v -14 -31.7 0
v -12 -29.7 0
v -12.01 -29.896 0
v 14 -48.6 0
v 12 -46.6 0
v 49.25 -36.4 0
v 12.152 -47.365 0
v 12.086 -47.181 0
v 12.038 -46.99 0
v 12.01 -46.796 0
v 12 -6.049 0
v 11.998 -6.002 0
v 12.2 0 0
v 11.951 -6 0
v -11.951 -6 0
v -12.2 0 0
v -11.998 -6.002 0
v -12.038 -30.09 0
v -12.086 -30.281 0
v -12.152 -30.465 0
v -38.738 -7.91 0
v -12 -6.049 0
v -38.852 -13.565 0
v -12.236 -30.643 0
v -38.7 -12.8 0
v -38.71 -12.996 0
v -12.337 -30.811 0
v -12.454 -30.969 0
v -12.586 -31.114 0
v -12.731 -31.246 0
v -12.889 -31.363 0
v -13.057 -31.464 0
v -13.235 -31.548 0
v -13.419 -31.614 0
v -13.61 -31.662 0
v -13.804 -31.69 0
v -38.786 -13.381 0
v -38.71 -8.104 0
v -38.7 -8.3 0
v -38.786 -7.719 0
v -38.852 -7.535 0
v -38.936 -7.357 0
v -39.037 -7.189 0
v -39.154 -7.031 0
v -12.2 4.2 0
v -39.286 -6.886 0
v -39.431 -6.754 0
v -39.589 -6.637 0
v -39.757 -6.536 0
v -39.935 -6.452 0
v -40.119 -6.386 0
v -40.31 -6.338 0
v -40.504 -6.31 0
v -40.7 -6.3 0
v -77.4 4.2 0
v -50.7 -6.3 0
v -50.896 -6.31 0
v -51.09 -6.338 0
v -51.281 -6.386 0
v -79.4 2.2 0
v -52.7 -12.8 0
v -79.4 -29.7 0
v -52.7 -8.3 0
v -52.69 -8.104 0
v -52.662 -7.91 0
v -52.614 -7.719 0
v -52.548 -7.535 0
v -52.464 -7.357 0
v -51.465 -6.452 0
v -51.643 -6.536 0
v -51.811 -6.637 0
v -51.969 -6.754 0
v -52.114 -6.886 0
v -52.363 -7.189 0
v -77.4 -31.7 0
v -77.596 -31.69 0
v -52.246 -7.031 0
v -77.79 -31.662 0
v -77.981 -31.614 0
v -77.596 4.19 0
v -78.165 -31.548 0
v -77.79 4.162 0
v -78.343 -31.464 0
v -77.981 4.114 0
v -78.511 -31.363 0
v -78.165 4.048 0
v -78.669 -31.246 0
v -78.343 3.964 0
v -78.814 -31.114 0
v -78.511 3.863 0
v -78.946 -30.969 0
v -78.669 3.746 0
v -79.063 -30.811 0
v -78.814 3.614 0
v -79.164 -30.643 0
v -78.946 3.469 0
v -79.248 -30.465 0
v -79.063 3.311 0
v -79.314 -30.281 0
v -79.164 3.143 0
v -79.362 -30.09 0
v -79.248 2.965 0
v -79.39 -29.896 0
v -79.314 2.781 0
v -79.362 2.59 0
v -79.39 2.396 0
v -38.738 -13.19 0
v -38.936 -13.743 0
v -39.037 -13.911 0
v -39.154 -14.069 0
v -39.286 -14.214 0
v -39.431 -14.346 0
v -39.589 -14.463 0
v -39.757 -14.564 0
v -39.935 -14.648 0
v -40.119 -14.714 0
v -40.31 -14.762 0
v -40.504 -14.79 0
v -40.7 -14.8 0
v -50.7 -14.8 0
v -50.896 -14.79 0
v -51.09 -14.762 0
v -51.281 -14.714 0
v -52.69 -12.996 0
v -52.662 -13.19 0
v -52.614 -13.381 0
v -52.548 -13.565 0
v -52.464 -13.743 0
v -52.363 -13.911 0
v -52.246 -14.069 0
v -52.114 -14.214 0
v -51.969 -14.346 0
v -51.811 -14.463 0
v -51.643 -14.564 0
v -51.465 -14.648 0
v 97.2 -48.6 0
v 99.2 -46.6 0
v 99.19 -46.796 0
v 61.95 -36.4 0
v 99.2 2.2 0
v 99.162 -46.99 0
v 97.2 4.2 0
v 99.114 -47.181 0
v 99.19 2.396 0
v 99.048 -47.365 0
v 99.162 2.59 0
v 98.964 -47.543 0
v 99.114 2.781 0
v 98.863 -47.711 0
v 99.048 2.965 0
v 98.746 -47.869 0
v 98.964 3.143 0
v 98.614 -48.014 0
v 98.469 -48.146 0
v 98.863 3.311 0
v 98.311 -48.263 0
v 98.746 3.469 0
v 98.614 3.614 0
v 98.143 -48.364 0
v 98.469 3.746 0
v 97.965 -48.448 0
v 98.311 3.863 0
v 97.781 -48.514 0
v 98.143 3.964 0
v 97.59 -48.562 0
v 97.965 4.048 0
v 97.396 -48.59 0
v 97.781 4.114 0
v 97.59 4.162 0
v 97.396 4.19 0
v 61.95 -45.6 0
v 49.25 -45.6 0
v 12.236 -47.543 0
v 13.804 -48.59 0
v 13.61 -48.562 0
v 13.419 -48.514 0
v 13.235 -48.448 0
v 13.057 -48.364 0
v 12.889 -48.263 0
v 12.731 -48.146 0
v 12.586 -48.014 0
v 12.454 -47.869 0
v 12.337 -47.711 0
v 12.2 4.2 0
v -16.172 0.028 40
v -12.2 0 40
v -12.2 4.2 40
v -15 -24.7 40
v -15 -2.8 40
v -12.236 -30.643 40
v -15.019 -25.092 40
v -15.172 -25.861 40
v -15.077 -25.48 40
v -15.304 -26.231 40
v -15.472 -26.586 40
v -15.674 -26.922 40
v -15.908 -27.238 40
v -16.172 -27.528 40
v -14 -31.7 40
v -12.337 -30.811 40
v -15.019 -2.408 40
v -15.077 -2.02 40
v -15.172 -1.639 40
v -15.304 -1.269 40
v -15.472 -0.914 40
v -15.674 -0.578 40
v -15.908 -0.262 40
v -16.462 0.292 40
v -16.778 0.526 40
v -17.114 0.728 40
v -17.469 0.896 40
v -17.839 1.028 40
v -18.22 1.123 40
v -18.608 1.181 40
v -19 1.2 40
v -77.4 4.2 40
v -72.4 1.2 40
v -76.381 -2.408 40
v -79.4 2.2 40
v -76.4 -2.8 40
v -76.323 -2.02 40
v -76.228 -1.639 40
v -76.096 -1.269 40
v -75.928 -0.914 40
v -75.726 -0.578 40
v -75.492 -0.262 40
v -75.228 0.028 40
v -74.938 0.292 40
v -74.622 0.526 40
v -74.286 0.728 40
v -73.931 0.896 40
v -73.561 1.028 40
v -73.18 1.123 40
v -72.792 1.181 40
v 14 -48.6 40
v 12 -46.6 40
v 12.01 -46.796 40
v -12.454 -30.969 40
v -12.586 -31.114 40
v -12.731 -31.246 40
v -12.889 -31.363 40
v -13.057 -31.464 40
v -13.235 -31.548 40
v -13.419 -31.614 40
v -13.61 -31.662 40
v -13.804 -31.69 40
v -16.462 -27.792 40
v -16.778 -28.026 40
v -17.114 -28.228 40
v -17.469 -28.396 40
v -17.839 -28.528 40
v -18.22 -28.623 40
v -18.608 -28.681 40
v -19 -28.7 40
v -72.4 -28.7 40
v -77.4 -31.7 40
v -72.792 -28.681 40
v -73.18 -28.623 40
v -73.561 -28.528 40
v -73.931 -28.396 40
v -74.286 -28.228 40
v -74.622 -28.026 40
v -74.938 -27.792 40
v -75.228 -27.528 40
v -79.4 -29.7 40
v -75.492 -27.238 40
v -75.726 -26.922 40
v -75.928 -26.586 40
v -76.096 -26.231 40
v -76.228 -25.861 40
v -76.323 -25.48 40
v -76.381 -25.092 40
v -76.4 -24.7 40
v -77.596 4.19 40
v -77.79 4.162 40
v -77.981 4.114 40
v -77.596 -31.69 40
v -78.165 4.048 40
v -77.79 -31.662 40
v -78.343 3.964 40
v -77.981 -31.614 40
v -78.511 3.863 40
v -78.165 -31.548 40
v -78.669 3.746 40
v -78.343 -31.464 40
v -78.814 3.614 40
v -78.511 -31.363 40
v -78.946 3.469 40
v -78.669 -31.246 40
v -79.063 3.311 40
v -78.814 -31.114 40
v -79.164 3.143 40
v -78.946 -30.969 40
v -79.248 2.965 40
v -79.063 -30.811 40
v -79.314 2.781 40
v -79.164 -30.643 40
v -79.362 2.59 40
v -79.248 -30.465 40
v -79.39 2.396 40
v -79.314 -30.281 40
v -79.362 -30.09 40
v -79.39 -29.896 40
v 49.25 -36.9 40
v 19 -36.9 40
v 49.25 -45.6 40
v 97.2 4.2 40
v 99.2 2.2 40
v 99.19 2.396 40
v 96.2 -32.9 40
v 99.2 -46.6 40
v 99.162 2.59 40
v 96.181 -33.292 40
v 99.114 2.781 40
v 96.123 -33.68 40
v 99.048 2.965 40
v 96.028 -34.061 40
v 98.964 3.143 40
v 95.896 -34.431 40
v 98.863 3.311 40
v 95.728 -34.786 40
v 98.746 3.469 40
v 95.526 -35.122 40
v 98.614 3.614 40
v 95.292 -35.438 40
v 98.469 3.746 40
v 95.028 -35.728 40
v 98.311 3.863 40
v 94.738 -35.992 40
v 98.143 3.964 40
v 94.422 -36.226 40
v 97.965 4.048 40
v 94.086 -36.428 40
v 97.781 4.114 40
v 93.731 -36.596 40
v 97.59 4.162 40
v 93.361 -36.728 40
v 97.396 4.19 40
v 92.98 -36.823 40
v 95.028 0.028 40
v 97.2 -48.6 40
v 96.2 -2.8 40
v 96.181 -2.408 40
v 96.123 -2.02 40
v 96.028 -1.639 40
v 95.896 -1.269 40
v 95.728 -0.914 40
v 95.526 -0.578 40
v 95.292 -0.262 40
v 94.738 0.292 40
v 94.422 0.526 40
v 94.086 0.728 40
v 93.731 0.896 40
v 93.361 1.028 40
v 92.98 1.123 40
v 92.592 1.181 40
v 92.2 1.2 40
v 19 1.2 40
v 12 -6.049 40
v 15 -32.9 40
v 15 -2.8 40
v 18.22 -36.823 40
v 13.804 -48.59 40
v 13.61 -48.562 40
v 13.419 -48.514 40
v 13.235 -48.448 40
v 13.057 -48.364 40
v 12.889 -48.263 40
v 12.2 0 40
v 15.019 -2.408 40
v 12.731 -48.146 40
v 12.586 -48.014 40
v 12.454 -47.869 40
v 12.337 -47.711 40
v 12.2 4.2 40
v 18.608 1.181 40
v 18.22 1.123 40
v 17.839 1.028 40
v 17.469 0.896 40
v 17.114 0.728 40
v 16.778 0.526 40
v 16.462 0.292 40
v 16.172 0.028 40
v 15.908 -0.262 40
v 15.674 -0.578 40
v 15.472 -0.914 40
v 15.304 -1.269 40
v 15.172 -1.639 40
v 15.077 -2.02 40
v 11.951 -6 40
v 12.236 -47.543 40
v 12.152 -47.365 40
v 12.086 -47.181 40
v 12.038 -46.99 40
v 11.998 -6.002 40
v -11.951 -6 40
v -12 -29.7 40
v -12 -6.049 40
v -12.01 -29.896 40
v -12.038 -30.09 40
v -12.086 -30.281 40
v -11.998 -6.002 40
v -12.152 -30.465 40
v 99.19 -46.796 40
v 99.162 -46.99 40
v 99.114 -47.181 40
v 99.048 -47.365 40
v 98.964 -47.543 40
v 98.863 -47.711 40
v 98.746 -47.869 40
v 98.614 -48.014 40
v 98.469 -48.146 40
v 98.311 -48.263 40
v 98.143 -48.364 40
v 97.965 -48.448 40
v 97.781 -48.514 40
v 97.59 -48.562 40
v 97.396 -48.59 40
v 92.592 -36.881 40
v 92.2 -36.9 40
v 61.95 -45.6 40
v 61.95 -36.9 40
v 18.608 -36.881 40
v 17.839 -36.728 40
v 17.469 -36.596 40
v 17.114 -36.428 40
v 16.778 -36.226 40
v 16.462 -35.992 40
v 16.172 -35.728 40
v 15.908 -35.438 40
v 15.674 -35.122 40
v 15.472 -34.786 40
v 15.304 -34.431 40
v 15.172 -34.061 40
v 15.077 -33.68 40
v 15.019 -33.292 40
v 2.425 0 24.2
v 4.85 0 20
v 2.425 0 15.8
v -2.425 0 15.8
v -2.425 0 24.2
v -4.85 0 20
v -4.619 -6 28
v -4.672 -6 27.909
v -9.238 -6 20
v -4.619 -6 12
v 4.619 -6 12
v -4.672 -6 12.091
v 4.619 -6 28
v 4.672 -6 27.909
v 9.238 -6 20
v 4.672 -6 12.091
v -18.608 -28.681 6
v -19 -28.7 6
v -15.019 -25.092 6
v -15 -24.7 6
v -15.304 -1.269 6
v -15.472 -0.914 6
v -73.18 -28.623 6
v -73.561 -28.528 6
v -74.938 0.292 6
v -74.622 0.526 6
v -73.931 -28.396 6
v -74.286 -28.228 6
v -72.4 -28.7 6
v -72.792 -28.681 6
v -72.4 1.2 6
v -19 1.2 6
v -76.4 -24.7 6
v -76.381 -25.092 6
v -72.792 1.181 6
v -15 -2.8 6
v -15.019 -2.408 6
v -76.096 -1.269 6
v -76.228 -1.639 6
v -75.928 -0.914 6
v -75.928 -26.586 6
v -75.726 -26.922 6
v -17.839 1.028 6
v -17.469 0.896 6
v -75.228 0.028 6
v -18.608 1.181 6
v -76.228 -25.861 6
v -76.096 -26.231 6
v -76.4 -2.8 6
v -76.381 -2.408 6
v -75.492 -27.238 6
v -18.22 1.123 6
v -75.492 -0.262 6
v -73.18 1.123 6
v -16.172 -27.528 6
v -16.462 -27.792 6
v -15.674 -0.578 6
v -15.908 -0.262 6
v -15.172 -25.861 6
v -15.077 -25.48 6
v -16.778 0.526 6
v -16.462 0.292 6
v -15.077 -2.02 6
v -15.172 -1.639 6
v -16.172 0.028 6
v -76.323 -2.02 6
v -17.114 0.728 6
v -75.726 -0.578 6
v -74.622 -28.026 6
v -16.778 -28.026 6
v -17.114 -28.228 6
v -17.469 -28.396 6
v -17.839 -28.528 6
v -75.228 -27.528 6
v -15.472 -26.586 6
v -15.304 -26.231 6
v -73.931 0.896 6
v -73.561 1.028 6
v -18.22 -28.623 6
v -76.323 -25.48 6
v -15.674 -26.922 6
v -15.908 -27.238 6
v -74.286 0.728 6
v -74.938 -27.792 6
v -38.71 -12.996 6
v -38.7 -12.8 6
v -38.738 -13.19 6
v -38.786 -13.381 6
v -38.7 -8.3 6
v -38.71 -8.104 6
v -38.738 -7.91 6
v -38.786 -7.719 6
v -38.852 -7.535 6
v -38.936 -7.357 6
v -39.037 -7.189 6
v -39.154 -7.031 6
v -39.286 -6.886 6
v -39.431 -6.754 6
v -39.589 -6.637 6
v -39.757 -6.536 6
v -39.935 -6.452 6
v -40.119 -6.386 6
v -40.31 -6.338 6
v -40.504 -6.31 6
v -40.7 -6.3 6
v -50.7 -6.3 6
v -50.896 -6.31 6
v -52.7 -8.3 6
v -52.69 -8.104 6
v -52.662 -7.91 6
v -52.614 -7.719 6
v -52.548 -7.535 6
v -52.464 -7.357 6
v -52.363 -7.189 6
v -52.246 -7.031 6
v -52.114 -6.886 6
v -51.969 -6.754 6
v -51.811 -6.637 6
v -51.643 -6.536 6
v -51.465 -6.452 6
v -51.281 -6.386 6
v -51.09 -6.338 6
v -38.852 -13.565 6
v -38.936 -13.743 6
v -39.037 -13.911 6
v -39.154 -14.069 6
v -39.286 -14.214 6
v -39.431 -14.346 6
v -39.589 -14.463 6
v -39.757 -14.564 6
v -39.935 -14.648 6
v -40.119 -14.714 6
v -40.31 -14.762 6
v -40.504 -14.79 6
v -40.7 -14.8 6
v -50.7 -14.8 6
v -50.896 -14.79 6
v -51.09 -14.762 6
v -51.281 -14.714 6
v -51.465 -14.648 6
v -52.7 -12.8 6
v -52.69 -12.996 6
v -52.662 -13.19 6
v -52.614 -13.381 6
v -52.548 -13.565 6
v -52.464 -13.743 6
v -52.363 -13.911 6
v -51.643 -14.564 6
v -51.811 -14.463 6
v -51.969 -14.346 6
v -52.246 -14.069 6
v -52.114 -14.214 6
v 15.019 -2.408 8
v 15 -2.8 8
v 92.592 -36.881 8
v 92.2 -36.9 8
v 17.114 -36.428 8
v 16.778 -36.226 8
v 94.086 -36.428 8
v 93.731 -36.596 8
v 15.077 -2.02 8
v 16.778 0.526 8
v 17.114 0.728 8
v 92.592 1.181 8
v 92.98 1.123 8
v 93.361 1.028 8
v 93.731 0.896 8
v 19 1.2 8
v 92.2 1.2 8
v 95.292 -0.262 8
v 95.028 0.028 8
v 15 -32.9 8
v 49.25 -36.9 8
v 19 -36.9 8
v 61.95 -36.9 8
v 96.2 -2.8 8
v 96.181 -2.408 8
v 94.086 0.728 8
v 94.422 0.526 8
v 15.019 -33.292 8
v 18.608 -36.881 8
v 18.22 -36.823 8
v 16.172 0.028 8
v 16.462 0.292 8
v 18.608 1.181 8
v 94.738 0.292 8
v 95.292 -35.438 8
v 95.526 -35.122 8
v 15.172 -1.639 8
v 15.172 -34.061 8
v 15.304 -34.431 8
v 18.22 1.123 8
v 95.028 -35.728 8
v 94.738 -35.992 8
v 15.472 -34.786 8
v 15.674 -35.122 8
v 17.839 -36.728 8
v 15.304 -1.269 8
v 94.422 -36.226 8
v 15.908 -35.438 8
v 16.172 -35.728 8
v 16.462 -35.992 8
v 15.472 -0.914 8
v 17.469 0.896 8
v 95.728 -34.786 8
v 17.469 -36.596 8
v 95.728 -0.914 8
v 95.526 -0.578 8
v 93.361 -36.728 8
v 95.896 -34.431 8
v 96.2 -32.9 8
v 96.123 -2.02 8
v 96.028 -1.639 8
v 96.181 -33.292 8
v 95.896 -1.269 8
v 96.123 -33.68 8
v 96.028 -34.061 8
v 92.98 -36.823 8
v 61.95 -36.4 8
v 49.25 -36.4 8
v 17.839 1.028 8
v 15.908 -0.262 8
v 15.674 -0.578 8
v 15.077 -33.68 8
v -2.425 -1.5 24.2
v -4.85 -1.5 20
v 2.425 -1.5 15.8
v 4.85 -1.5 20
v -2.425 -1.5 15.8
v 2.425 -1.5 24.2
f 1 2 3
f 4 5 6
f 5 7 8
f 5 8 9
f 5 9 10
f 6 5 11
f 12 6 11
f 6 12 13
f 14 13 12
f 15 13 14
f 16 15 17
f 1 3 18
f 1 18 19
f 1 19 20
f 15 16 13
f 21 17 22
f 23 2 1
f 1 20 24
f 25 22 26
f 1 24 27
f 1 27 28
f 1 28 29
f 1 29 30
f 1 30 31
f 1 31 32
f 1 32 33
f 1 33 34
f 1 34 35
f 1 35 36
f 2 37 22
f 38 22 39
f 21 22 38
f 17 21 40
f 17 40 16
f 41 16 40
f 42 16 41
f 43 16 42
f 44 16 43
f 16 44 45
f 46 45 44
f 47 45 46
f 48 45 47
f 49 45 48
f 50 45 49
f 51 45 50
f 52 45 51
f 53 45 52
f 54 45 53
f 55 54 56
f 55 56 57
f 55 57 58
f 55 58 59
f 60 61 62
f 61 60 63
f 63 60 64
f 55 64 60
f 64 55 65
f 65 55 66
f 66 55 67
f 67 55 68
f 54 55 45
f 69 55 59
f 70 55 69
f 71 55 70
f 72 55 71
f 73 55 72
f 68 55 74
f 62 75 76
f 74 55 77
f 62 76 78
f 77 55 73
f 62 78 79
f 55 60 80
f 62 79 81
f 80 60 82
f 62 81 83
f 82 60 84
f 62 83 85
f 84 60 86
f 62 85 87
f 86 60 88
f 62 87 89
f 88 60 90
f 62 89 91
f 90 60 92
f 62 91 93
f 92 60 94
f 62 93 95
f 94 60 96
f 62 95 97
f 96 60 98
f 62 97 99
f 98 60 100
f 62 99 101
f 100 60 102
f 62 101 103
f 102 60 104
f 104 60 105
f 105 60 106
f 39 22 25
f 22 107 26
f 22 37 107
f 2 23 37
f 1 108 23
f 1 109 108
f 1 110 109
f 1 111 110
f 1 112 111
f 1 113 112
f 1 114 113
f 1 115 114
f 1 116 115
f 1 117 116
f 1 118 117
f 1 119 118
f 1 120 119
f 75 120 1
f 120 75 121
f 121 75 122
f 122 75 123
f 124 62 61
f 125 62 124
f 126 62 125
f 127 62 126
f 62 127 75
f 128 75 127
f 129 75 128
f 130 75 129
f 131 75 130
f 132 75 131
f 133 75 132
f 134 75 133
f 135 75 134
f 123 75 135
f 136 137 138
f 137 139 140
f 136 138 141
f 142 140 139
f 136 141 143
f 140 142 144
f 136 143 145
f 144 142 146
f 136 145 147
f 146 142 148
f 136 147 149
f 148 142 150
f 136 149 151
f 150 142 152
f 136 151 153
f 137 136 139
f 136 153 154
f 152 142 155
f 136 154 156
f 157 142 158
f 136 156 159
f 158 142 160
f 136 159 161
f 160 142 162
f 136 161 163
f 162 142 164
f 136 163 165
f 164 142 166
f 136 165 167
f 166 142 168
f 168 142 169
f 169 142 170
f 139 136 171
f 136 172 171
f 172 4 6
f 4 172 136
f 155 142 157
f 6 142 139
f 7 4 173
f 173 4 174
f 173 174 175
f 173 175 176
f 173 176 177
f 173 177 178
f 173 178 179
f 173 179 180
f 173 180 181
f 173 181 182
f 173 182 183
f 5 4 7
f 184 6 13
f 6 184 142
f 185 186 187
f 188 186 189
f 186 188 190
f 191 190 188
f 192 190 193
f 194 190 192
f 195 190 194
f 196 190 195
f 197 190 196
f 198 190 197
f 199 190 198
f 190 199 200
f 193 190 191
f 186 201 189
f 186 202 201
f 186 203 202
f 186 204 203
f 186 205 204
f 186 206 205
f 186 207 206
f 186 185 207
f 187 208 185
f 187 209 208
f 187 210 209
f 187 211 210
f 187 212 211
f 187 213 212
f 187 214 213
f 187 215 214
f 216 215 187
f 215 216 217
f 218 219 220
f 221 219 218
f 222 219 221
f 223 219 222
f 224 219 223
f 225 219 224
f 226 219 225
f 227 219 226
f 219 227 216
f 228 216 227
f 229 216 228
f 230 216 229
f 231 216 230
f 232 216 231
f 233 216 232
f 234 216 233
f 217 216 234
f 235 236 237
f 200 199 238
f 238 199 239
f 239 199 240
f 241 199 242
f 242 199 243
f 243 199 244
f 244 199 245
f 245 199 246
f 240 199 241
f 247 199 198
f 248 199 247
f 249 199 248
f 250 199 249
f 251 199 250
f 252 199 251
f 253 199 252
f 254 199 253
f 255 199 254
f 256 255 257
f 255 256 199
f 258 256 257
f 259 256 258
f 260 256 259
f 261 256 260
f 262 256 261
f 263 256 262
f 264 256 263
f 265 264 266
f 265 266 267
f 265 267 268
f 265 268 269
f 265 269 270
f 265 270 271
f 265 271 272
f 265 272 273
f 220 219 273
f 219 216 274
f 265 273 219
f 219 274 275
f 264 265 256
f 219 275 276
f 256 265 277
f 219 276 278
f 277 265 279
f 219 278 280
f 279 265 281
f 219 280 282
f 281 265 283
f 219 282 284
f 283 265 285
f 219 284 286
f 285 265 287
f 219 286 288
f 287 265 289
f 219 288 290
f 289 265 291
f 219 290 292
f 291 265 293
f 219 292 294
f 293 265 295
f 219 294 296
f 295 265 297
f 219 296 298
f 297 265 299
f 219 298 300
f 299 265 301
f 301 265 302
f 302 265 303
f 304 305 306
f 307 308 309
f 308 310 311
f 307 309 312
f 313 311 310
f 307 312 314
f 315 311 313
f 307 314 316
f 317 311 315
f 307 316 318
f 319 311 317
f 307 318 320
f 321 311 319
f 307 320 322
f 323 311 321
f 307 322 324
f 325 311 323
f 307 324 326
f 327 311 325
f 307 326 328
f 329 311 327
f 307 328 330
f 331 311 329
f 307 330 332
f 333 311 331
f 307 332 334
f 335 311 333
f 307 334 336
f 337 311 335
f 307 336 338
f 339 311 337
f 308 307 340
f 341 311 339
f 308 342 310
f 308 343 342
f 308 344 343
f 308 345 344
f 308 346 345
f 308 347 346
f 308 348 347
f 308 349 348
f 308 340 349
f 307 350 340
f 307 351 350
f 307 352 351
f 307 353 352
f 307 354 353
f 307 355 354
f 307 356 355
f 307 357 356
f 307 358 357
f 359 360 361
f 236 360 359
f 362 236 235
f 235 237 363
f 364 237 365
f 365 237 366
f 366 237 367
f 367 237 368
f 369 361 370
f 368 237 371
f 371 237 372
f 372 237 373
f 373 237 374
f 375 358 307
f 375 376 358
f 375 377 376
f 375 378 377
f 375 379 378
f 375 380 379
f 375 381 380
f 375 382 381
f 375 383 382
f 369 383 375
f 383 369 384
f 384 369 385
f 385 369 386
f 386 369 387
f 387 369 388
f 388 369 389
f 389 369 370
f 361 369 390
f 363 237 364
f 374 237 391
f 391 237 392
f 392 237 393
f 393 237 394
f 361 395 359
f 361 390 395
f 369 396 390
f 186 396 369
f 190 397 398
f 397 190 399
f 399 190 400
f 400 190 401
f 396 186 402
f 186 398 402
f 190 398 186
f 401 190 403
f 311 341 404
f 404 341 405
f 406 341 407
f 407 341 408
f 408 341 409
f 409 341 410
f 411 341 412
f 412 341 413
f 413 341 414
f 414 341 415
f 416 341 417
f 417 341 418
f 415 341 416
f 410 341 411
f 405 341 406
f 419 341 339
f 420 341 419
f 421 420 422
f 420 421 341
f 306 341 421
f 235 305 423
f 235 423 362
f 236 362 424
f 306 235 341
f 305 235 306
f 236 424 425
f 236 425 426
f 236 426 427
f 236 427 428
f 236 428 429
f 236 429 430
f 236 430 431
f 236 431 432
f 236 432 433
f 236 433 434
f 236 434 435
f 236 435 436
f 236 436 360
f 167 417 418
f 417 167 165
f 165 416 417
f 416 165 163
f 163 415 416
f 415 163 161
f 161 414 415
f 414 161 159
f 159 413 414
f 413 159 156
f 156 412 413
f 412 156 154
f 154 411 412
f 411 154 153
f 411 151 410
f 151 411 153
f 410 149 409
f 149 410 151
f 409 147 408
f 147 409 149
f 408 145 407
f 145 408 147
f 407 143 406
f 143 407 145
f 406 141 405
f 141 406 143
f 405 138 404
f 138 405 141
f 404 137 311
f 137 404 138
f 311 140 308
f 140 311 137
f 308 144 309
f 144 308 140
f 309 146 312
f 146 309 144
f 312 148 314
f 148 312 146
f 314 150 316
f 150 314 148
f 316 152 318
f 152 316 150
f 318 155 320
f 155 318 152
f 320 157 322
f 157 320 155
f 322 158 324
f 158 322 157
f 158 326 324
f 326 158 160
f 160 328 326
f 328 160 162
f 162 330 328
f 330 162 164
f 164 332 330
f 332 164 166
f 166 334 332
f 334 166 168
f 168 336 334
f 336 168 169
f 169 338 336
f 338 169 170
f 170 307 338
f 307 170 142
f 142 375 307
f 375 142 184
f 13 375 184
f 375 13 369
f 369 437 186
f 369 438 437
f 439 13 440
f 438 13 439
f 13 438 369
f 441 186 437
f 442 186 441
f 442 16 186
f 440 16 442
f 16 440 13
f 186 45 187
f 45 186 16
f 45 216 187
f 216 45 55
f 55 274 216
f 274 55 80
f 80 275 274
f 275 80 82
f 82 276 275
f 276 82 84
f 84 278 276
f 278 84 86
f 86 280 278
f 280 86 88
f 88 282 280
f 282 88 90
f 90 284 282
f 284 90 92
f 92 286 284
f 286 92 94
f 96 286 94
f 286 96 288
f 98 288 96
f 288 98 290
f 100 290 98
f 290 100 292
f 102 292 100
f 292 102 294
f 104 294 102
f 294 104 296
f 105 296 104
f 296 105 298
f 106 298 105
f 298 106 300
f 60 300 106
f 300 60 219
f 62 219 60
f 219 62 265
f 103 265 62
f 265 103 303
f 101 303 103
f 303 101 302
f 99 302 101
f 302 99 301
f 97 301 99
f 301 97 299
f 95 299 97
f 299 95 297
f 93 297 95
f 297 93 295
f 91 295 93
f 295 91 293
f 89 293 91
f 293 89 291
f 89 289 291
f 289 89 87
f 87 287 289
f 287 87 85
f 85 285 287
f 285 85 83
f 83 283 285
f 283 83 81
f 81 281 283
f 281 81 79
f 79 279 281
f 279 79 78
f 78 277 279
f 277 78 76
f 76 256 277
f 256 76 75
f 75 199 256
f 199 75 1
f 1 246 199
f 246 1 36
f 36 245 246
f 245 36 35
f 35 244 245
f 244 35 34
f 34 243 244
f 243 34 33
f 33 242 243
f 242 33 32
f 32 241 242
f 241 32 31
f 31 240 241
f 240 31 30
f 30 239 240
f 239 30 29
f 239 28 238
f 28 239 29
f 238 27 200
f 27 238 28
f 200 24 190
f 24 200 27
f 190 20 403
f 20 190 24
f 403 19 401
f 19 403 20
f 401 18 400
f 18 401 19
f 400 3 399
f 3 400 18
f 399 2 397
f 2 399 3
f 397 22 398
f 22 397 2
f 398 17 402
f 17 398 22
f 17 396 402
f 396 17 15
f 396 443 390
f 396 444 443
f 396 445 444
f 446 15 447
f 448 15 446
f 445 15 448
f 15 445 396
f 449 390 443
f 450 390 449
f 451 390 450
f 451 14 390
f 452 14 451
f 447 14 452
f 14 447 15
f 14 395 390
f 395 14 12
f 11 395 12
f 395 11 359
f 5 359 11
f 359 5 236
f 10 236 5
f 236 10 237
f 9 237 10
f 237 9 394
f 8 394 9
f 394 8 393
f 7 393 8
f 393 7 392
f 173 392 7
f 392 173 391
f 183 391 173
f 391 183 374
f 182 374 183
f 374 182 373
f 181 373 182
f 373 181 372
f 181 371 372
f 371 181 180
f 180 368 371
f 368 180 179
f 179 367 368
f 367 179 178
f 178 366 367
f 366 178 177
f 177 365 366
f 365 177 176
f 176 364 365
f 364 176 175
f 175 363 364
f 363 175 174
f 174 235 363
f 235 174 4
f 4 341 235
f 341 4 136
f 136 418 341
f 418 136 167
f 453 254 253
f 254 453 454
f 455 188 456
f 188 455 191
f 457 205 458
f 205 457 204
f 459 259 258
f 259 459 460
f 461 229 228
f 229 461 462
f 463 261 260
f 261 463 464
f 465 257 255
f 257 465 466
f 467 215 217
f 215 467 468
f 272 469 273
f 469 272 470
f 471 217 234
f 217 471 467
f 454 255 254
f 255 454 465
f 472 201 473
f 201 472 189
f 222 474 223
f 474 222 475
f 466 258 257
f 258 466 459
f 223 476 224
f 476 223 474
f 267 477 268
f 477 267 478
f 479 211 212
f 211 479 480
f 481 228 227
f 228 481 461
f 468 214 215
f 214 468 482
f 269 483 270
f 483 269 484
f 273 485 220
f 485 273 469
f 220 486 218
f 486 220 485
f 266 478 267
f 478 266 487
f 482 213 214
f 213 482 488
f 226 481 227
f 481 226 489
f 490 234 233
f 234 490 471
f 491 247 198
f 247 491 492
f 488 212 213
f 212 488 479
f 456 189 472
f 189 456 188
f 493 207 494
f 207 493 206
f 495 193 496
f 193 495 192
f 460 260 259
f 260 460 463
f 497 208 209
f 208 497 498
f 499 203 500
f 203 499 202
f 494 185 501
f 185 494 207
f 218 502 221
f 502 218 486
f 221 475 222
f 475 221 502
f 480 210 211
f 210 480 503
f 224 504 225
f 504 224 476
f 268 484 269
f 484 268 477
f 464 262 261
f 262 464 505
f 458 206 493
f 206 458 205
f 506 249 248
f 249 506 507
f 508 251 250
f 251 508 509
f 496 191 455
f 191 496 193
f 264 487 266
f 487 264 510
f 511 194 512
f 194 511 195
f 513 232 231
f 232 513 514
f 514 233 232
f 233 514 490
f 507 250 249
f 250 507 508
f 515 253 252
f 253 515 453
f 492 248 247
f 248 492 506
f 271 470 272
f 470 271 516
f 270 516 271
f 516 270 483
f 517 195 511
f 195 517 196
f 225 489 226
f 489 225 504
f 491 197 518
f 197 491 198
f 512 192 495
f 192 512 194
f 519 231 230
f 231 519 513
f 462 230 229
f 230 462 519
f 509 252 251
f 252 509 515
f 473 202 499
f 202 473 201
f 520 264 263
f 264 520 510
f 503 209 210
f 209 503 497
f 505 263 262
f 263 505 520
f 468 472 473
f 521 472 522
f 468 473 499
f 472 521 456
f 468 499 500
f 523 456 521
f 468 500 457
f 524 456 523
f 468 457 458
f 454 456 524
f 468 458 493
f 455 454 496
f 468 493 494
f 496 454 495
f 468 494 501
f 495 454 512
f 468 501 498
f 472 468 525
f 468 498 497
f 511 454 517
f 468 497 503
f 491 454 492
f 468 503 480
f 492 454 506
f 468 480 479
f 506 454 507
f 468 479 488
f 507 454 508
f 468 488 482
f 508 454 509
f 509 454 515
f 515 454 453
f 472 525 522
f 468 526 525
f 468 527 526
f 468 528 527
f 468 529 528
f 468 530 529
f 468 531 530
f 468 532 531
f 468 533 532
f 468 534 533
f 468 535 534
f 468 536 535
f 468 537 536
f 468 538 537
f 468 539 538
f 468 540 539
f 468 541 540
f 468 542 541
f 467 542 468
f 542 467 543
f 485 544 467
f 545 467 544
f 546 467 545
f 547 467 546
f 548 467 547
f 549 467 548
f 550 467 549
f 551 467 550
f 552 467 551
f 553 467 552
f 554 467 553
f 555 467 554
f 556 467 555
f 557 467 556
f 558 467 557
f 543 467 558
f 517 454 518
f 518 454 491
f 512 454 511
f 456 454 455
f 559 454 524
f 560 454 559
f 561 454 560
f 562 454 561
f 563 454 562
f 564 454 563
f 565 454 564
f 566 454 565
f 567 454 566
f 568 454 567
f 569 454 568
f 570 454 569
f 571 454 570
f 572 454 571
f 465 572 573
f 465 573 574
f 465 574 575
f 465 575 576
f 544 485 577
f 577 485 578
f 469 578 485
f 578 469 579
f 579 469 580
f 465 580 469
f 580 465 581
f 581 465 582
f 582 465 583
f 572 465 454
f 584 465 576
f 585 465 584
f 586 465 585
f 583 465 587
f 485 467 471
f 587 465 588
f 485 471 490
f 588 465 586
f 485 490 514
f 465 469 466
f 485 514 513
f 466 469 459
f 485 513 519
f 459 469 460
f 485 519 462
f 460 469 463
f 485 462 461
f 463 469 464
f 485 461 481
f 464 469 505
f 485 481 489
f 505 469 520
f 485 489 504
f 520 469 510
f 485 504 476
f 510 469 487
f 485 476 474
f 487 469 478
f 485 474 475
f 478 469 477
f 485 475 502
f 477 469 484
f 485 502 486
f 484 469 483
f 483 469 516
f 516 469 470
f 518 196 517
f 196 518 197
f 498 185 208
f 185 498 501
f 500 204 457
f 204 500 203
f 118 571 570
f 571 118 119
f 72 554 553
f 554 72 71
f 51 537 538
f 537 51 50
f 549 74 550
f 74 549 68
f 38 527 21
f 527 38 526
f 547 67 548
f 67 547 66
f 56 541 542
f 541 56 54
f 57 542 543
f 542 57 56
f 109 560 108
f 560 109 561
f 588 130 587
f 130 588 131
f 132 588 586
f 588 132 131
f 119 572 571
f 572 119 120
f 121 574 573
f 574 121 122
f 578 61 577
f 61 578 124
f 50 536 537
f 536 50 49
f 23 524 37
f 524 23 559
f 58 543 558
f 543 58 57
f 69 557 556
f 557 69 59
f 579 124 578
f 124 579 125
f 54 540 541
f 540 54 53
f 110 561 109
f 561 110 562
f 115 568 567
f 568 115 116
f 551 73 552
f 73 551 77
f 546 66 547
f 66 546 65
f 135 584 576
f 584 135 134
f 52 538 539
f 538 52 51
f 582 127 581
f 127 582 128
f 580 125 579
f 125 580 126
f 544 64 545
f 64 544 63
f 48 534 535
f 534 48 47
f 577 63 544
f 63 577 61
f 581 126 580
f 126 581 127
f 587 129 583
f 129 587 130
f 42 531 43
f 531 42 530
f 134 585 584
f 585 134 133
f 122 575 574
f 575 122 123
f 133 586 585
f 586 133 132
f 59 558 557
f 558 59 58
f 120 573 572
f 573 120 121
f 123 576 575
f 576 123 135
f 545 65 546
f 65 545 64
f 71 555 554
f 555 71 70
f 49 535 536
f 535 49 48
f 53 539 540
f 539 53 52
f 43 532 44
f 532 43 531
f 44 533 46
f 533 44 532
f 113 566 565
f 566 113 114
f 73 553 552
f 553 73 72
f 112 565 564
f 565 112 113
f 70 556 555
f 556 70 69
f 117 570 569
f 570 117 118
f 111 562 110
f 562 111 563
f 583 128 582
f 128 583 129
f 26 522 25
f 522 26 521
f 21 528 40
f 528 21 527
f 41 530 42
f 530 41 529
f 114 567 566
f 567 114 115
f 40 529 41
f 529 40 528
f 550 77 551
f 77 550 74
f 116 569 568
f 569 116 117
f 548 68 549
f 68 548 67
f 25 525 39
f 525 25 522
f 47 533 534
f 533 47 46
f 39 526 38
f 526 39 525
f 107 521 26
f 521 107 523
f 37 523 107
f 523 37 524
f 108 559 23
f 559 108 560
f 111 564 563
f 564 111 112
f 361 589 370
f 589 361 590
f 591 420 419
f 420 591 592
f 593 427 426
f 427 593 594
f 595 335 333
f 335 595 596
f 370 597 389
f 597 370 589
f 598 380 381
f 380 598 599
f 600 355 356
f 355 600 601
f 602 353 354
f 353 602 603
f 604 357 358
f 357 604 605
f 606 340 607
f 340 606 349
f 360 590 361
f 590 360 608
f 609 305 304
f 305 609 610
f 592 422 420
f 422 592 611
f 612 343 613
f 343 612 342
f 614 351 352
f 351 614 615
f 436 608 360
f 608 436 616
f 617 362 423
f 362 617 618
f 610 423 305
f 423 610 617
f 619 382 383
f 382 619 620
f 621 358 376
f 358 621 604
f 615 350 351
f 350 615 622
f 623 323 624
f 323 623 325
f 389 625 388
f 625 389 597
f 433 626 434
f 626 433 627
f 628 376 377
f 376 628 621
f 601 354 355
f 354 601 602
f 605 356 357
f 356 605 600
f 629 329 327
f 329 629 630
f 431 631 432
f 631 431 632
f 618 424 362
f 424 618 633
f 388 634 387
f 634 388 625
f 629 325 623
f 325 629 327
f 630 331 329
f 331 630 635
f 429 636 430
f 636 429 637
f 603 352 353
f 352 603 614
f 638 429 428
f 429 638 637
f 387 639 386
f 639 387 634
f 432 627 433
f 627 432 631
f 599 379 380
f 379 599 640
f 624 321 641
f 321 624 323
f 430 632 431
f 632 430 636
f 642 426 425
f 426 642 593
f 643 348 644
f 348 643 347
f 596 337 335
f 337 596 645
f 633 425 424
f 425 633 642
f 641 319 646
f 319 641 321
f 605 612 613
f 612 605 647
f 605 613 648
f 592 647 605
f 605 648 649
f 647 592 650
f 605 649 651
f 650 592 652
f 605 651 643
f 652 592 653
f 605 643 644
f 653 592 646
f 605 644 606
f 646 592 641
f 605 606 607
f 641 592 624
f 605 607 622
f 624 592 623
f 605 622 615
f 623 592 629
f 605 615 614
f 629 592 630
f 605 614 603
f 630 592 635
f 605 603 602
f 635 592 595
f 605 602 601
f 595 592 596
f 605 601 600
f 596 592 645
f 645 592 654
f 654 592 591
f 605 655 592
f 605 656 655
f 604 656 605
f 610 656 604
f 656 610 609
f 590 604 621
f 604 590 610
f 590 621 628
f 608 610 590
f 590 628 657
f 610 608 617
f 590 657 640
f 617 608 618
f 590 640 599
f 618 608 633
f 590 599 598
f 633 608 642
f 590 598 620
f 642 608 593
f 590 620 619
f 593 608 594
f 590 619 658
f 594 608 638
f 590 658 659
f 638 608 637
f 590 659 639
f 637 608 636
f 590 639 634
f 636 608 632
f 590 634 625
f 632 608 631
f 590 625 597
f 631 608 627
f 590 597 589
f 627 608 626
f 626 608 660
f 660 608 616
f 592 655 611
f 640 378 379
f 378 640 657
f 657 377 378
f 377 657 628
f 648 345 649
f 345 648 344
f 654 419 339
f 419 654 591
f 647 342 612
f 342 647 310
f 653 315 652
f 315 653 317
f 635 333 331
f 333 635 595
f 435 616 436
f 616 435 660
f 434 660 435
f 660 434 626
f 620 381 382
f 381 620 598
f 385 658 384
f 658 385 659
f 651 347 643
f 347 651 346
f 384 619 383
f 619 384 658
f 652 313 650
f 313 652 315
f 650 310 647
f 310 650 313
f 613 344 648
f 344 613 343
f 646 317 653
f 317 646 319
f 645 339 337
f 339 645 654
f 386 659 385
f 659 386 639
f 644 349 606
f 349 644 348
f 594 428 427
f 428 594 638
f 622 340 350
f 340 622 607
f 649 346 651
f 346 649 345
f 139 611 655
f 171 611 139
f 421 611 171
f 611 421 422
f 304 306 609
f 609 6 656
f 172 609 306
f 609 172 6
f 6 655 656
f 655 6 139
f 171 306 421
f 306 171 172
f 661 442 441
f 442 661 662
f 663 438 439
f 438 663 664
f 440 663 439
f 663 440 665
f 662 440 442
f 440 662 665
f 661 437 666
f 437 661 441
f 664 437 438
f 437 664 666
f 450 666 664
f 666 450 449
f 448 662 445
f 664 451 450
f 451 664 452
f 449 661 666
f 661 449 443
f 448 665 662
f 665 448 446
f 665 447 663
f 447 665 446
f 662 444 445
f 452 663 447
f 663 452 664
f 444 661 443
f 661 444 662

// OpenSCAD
// file: ../../modules/steel_rack.scad
use <bolts.scad>;

bolt_edge_offset = 15;
bolt_positions = [
  bolt_edge_offset,
  bolt_edge_offset + 98,
  bolt_edge_offset + 98 + 24,
];

module bolt_and_nut(y, h) {
  nut_thickness = 5;
  translate([0, y, h / 2])
    m6_bolt_hole(h + 1, center = true);
  translate([0, y, h - nut_thickness / 2])
    rotate([0, 0, 90])
    m6_nut_trap(nut_thickness, center = true);
}

module long_bar(w, y, h) {
  difference() {
    translate([w / 2, y / 2, h / 2])
      cube([w, y, h], center = true);

    for (x = bolt_positions) {
      translate([x, 0, 0])
        bolt_and_nut(y / 2, h);
    }
  }
}

module short_bar(w, y, h) {
  difference() {
    translate([w / 2, y / 2, h / 2])
      cube([w, y, h], center = true);

    translate([bolt_positions[0], 0, 0])
      bolt_and_nut(y / 2, h);
  }
}

module fillet_profile(r, h) {
  linear_extrude(height = h, center = true)
    difference() {
      square([r, r]);
      circle(r = r, $fn = 64);
    }
}
// file: ../../modules/bolts.scad
module nut_trap(d, h, center = true) {
  linear_extrude(height = h, center = center)
  circle(d = d / cos(30), $fn = 6);
}

module bolt_hole(d, h, center = true) {
  linear_extrude(height = h, center = center)
  circle(d = d, $fn = 64);
}

// Hex holes for self-tapping (nominal - 0.2mm)
module hex_hole(flat_d, h) {
  linear_extrude(height = h, center = true)
  circle(d = flat_d / cos(30), $fn = 6);
}

module m3_bolt_hexhole(h) {
  rotate([0, 0, 90]) hex_hole(flat_d = 2.8, h = h);
}

module m4_bolt_hexhole(h) {
  rotate([0, 0, 90]) hex_hole(flat_d = 3.8, h = h);
}

module m6_bolt_hexhole(h) {
  rotate([0, 0, 90]) hex_hole(flat_d = 5.8, h = h);
}

module m8_bolt_hexhole(h) {
  rotate([0, 0, 90]) hex_hole(flat_d = 7.8, h = h);
}

// M3
module m3_bolt_hole(h, center = false) { bolt_hole(d = 3.4, h = h, center = center); }
module m3_nut_trap(h, center = false) { nut_trap(d = 5.7, h = h, center = center); }

// M4
module m4_bolt_hole(h, center = false) { bolt_hole(d = 4.4, h = h, center = center); }
module m4_nut_trap(h, center = false) { nut_trap(d = 7.5, h = h, center = center); }

// M6
module m6_bolt_hole(h, center = false) { bolt_hole(d = 6.2, h = h, center = center); }
module m6_nut_trap(h, center = false) { nut_trap(d = 10.2, h = h, center = center); }

// M8
module m8_bolt_hole(h, center = false) { bolt_hole(d = 8.4, h = h, center = center); }
module m8_nut_trap(h, center = false) { nut_trap(d = 13.3, h = h, center = center); }
// file: ../../modules/slide_rail_outer_bracket.scad
use <bolts.scad>
use <steel_rack.scad>

// スライドレール外側とL字アングルを接合するL字ブラケット。
// 設計の経緯と確定値は ledger/designs/steel-rack-500x400.md が正本。
//
// 座標系 (部品自身の datum):
//   X = 0 がこの部品側のL字アングル外側面。部品はアングル板厚の内側から始まる
//   Y = 0 がスライドレール外側面。+Y がラック外側
//   Z = 0 が部品底面 (レール下端と一致)
// front は screw_x = [37, 101.5]、rear は [79.5, 176] を自分の datum
// から渡す。 M6 が高さ 22.5±12 の対称配置のため部品は Z 反転対称になり、
// 左右のレールにも上下反転するだけで同じ2部品を使い回せる。

bracket_height = 45;
flange_t = 10; // 短辺 (X方向厚) の厚さ
// 長辺 (Y方向厚) の厚さ。旧断面は flange_t=10 を共用していたが、レール面を
// rail_offset 分外へ出すと M6 ナット挿入口が長辺と重なるため 2mm 削った
// (10→8、user決定)。ナット六角の内縁 (y=8.000) と長辺外面がツライチになる
arm_t = 8;
// レール接触面のラック外側オフセット。組付け実測でレール間隔が 385mm しか
// なくケース 412mm が入らないため、(412 - 385) / 2 + 0.5 = 14mm ずつ
// 各レールを外側へ移す (user指示)。M6 実穴は既に開いており位置を変えられない
rail_offset = 14;
inner_r = 4;
m6_z = [ 10.5, 34.5 ];
// クリアランス基準: 呼び寸法 + 0.4mm (実プリントの嵌合結果から拡大)
m6_pass_flat = 6.4; // M6ボルト通し六角の二面幅 (手前5mm)
m6_nut_flat = 10.4; // M6ナット窪み六角の二面幅 (奥5mm、ナット実測9.8 + 実効0.6)
m6_stage_depth = 5;
screw_z = 22.5;
m4_pass_flat = 4.4; // M4小トラスネジ通し六角の二面幅
m4_nut_flat = 7.4; // M4ナット窪み六角の二面幅 (ナット実測6.8 + 実効0.6)
m4_nut_depth = 2.8; // M4ナット窪みの深さ (user指定)
edge_margin = 8; // 穴の外縁から部品端までの余白 (自由な辺のみ)
angle_t = 2.2; // L字アングルの板厚

// 六角プリズム: 軸X・上下の辺が水平 (flat-up)。
// 天井を短い水平ブリッジにして垂れの改善を狙う
// (point-up だと天井面が水平から30°になり垂れた — 嵌合試験で確認済み)
module
hex_x_flat_up(flat_d, l)
{
    rotate([ 0, 90, 0 ]) rotate([ 0, 0, 90 ]) hex_hole(flat_d = flat_d, h = l);
}

// 六角プリズム: 軸Y・上下の辺が水平 (flat-up)。M6と同じくブリッジ天井
module
hex_y_flat_up(flat_d, l)
{
    rotate([ 90, 0, 0 ]) hex_hole(flat_d = flat_d, h = l);
}

module
slide_rail_outer_bracket(screw_x, name = "bracket")
{
    // flat-up配置では水平方向の穴半径は対角/2 (= 二面幅/(2*cos30))。
    // 8mm余白の契約はこの実半径に対して守る
    m6_nut_diag = m6_nut_flat / cos(30);
    m4_nut_diag = m4_nut_flat / cos(30);
    // M6中心: 実物のアングルには旧断面 (長辺厚10) の導出値
    // (厚10 + 内側R + 余白 + M6六角対角/2 = 28.0044) で既に穴が開いている。
    // 旧導出式から rail_offset を引くことで M6 実穴と部品外端の絶対位置を
    // 保ったまま、レール接触面 (y=0) だけをラック外側へ 14mm 出す
    m6_y = flange_t + inner_r + edge_margin + m6_nut_diag / 2 - rail_offset;
    short_len = m6_y + m6_nut_diag / 2 + edge_margin;
    // 長辺のX終端: 最奥のM4穴の最大断面 (ナット窪みの対角の半分) + 余白
    arm_end = max(screw_x) + m4_nut_diag / 2 + edge_margin;

    echo(str("CONTRACT ", name, ": height = ", bracket_height));
    echo(str("CONTRACT ", name, ": flange_t = ", flange_t));
    echo(str("CONTRACT ", name, ": arm_t = ", arm_t));
    echo(str("CONTRACT ", name, ": rail_offset = ", rail_offset));
    echo(str("CONTRACT ", name, ": inner_r = ", inner_r));
    echo(str("CONTRACT ", name, ": m6_z = ", m6_z));
    echo(str("CONTRACT ", name, ": m6_pass_flat = ", m6_pass_flat));
    echo(str("CONTRACT ", name, ": m6_nut_flat = ", m6_nut_flat));
    echo(str("CONTRACT ", name, ": screw_z = ", screw_z));
    echo(str("CONTRACT ", name, ": m4_pass_flat = ", m4_pass_flat));
    echo(str("CONTRACT ", name, ": m4_nut_flat = ", m4_nut_flat));
    echo(str("CONTRACT ", name, ": m4_nut_depth = ", m4_nut_depth));
    echo(str("CONTRACT ", name, ": edge_margin = ", edge_margin));
    echo(str("CONTRACT ", name, ": angle_t = ", angle_t));
    echo(str("CONTRACT ", name, ": screw_x = ", screw_x));
    echo(str("CONTRACT ",
             name,
             ": m6_y = ",
             m6_y,
             ", short_len = ",
             short_len,
             ", arm_end = ",
             arm_end));

    // 余白の契約 (自由な辺のみ。高さ45とM6のZはuser固定値なので対象外)。
    // M6ナット六角の内縁 (m6_y - 対角/2 = 8.000) は長辺外面 (y = arm_t) と
    // ツライチで、ナット挿入口が長辺に塞がれない (1e-9 は浮動小数の丸め猶予)
    assert(m6_y - m6_nut_diag / 2 >= arm_t - 1e-9,
           "M6 nut slot is blocked by the arm");
    assert(short_len - (m6_y + m6_nut_diag / 2) >= edge_margin,
           "M6 hole too close to the short-flange edge");
    assert(arm_end - (max(screw_x) + m4_nut_diag / 2) >= edge_margin,
           "M4 hole too close to the arm end");
    assert(min(screw_x) - m4_nut_diag / 2 >= angle_t + flange_t,
           "M4 hole overlaps the short flange");

    difference()
    {
        union()
        {
            // 短辺: アングル内側に当たる縦板 (M6で締結)
            translate([ angle_t, 0, 0 ])
                cube([ flange_t, short_len, bracket_height ]);

            // 長辺: レール外側面に当たる横板 (M4小トラスネジ+ナットで締結)
            translate([ angle_t, 0, 0 ])
                cube([ arm_end - angle_t, arm_t, bracket_height ]);

            // 内側コーナーのR4フィレット (応力集中の回避)
            translate([
                angle_t + flange_t + inner_r,
                arm_t + inner_r,
                bracket_height / 2
            ]) rotate([ 0, 0, 180 ]) fillet_profile(inner_r, bracket_height);
        }

        // M6の2段六角穴 (軸X・flat-up): 手前5mmが通し、奥5mmがナット窪み。
        // ナット窪みは +X へ延長した挿入回廊 (x=7.2..17): 短辺の背面から
        // fillet の掛かる区間を局所カットし、fillet 外端 (x=16.2) を 0.8mm
        // 超えて開放することで M6 ナットを +X 側から真っ直ぐ挿入できる
        // (fillet と挿入経路の干渉分を削るのは user 許容)。
        // 六角の下頂点 (y=8.000) は長辺外面とツライチで、正確な接触は
        // 退化した稜 (非多様体STL) を作るため、hull で 0.2mm 下へ掃引して
        // 長辺外面に浅い逃げ溝を彫る (ナットの嵌合には影響しない)
        slot_start = angle_t + flange_t - m6_stage_depth;
        slot_end = angle_t + flange_t + inner_r + 0.8;
        slot_relief = 0.2;
        for (z = m6_z) {
            translate([ angle_t + m6_stage_depth / 2 - 0.05, m6_y, z ])
                hex_x_flat_up(m6_pass_flat, m6_stage_depth + 0.1);
            translate([ (slot_start + slot_end) / 2, m6_y, z ]) hull()
            {
                hex_x_flat_up(m6_nut_flat, slot_end - slot_start);
                translate([ 0, -slot_relief, 0 ])
                    hex_x_flat_up(m6_nut_flat, slot_end - slot_start);
            }
        }

        // M4小トラスネジの穴 (軸Y・flat-up):
        // 通しは全厚を貫通し、L字の内側面 (y=8) から深さ2.8mmのナット窪み。
        // ネジはレール内側から刺さり
        // (トラス頭はスライダーと干渉しない実測済み)、
        // ナットが窪みの底で受けてレール板とブラケットを共締めする
        for (x = screw_x) {
            translate([ x, arm_t / 2, screw_z ])
                hex_y_flat_up(m4_pass_flat, arm_t + 0.2);
            translate([ x, arm_t - m4_nut_depth / 2 + 0.05, screw_z ])
                hex_y_flat_up(m4_nut_flat, m4_nut_depth + 0.1);
        }
    }
}
// main file
use <../../modules/slide_rail_outer_bracket.scad>

// ゲーム用デスクのイヤホン・マイク置き (クランプ留めの単一プリント部品)。
// 設計の経緯と確定値は ledger/designs/game-desk-earphone-mic-holder.md が正本。
// デスククランプは他にも作る予定があるため、部品名は留め方 (クランプ) では
// なく「何を置くか」を主語にする (user 指示)。
//
// 中央がクランプ取付座、左が Bluetooth イヤホンケースのポケット、右が
// Bluetooth ピンマイクケースのポケット。デスククランプの立ち上がり板
// (40×24×4.2・中央にM8メス) へ、部品の外側から皿ネジ1本で締める。
//
// 座標系 (部品自身の datum):
//   X = 0 がクランプ取付座の左右中心。-X がイヤホン側、+X がピンマイク側
//   Y = 0 がクランプ板への当たり面。-Y へ本体 (取付座とポケット) が伸びる。
//     +Y 側はクランプ板 4.2 を逃がす帯と、その左右でデスク面 (y=4.2) へ
//     当たる段になる
//   Z = 0 が部品底面。+Z が上で、上端は 40 の一平面 (クランプ板と同じ高さ)
// M8 の中心は取付座の中央 = (X, Z) = (0, 20) で、クランプ板 40×24 の
// 中央のメスネジと一致する。
//
// 前後の定義: 前 = デスク接触面 (y=4.2) の側、後 = その反対側。ケースを
// 差し込む向き依存の feature (USB-C 長穴・凸チャンネル) は、この前壁の内面
// (front_inner_y) を基準に置く。
//
// 印刷向き: 底面 (z=0) をビルドプレートへ置き、ポケットの開口を上へ向ける。
// 壁・ポケット・切り欠きはすべて垂直面で、水平な天井を持つのは M8 の
// 六角穴だけ (flat-up = 天井が短い水平ブリッジ) になる。外側の垂直エッジは
// R2 で落とし、底面の水平エッジは未加工のまま残す。

// --- 実測値 (すべて現物合わせ前提の暫定値) ---
clamp_plate_w = 24;  // クランプ立ち上がり板の横幅 (X)
clamp_plate_t = 4.2; // 同・板厚 (Y)。M8メスの掛かり代でもある
clamp_plate_h = 40;  // 同・高さ (Z)
m8_pass_flat = 8.4;  // M8皿ネジ軸部の通し六角 二面幅 (呼び7.8Φ)
m8_head_flat = 16.0; // 皿逃げの六角錐台 外面側の二面幅 (実測15.6Φ)
m8_head_depth = 4.5; // 皿部分の高さ
m8_screw_len = 8.6;  // 皿込みの全長
// クリアランス: ケースは「少しスカスカなくらい」が良いとの user 判断で 0.4
clearance = 0.4;
// アイテム1: Bluetooth イヤホンのケース (横幅・奥行き・ケースを沈める深さ)
ear_case = [ 61.0, 29.5, 34.0 ];
// アイテム2: Bluetooth ピンマイクのケース
mic_case = [ 80.8, 37.7, 32.0 ];
// ピンマイクケースの背面へ噛ませる L字 USB-C 変換器の張り出し (幅・厚さ)
mic_adapter = [ 12.3, 8.3 ];
usb_slot_w = 14; // イヤホンケース底面の USB-C 長穴の幅 (横中央)
// 前壁 = デスク接触面側の壁。ケースの前面がデスク側を向く差し込み向き
usb_slot_front = 7.5; // 前壁内面から長穴の手前側まで
usb_slot_back = 16.0; // 前壁内面から長穴の奥側まで (前面9・奥面15の再計算値)
usb_slot_r = 2; // 長穴の角丸 (ケーブルの角が丸いので角丸で足りる)

wall = 3; // ポケットの側壁厚
// ポケットの床厚。上端をクランプ板の上端 (Z40) と同じ一平面へ揃えるのが
// 必須要件なので、収納深さ (34 / 32) を変えずに床の厚みで高さの差を吸収する。
// 増えるのはインフィルだけなので重量・材料の問題にはならない (user 判断)
ear_floor_t = 6;
mic_floor_t = 8;
pocket_r = 4; // ポケット内側コーナーのR (ケースの角が丸いため)
corner_r = 2; // 外側垂直エッジのR (角が刺さると痛いという user 指示)
arc_fn = 64; // 円弧の分割数 (このリポジトリの既存慣行)
// 取付座の板厚。皿の逃げ 4.5 + 残り肉1.5 で決めた。皿ネジは
// 皿込み8.6 (軸部4.1) しか無いので、座を厚くするほど軸がクランプ板へ届か
// なくなる (板厚8なら掛かりは 8.6-8 = 0.6mm しか残らない)。残り肉1.5mm を
// 皿の座面兼ブリッジとして確保したうえで、クランプ板4.2の M8 メスへ
// 8.6 - 6.0 = 2.6mm 掛ける配分にした。掛かりを増やすには座を薄くするか、
// より長い M8 皿ネジへ替える (実物合わせで再評価する)
mount_t = 6.0;

// --- 派生値 ---
m8_shank_len = m8_screw_len - m8_head_depth; // 軸部 4.1
screw_engagement = m8_shank_len - (mount_t - m8_head_depth);
// flat-up 配置では水平方向の穴半径は対角/2 (= 二面幅/(2*cos30))
m8_head_diag = m8_head_flat / cos(30);
// 皿の逃げの絞り勾配 (二面幅/深さ)。外面16.0 から深さ4.5 で通し8.4 になる
m8_head_slope = (m8_head_flat - m8_pass_flat) / m8_head_depth;
m8_head_over = 0.1; // 錐台を外面より外へ出す切削の抜き代
seat_w = clamp_plate_w;
seat_h = clamp_plate_h;
m8_z = seat_h / 2;
// クランプ板を逃がす帯の幅。板 24 に対してクリアランスは総量 0.4 (片側0.2)
// で取る。左右それぞれへ 0.4 振ると帯が 24.8 になり、板が帯の中で泳ぐ
clamp_slot_w = clamp_plate_w + clearance;

ear_inner = [ ear_case[0] + clearance, ear_case[1] + clearance ]; // 61.4×29.9
ear_depth = ear_case[2];
mic_inner = [ mic_case[0] + clearance, mic_case[1] + clearance ]; // 81.2×38.1
mic_depth = mic_case[2];
// 凸断面の切り欠き: L字変換器を装着したまま上から落とし込むための通路
mic_channel = [ mic_adapter[0] + clearance, mic_adapter[1] + clearance ];

ear_out_w = ear_inner[0] + 2 * wall;
ear_out_d = ear_inner[1] + 2 * wall;
ear_out_h = ear_depth + ear_floor_t;
ear_x0 = -seat_w / 2 - ear_out_w; // 左ポケットの左端

// 背面 (デスクの反対側) は「外壁 wall + チャンネル奥行き」を確保する。
// チャンネルは背面壁の中に彫るのではなく、背面壁を厚くしてその中を通す
// (外壁3mmは残る)
mic_out_w = mic_inner[0] + 2 * wall;
mic_out_d = mic_inner[1] + mic_channel[1] + 2 * wall;
mic_out_h = mic_depth + mic_floor_t;
mic_x0 = seat_w / 2; // 右ポケットの左端 (取付座の右端と共有)
outer_w = ear_out_w + seat_w + mic_out_w; // 部品全体の横幅 178.6
// 部品全体の奥行き 52.8。両ポケットのブロックはデスク接触面から始まるので、
// デスク側の段 4.2 はブロックの中に含まれる。当たり面から +Y へ 4.2 の帯を
// 別に足していた旧構成の 52.8 + 4.2 = 57 は superseded
outer_d = max(ear_out_d, mic_out_d);

// デスク接触面。当たり面 (y=0) から +Y へクランプ板の厚みだけ回り込む
desk_y = clamp_plate_t;
// 前壁 (デスク側) の内面。両ポケットとも、外形をデスク接触面から始めて
// 「壁3 → ケース内寸 → (チャンネル) → 壁3」の順に並べるので、前壁は
// デスク側・反対側とも実厚 3mm になる。ポケットを当たり面 (y=0) 基準に
// 置いて +Y へ 4.2 の帯を足していた旧構成は、前壁が 3 + 4.2 = 7.2mm に
// なっていた (superseded)
front_inner_y = desk_y - wall;
// 各ポケット内寸の原点 (X, Y) = 前壁内面から奥へ内寸の分だけ下がった角
ear_cav = [ ear_x0 + wall, front_inner_y - ear_inner[1] ];
mic_cav = [ mic_x0 + wall, front_inner_y - mic_inner[1] ];
ear_cav_cx = ear_cav[0] + ear_inner[0] / 2;
mic_cav_cx = mic_cav[0] + mic_inner[0] / 2;
// 凸チャンネルの奥端 = 背面 (デスクの反対側) 外壁の内面
mic_back_inner_y = desk_y - mic_out_d + wall;
usb_slot_y = front_inner_y - usb_slot_back; // 長穴の奥端 (前壁内面から16.0)

// 四隅を r で丸めた矩形の2D輪郭 (原点が左下・X方向 w・Y方向 d)
module
rounded_rect_2d(w, d, r)
{
    translate([ r, r ]) offset(r = r, $fn = arc_fn)
        square([ w - 2 * r, d - 2 * r ]);
}

// 六角錐台 (軸Y・flat-up): 原点が二面幅 flat_a の面で、+Y へ l 進む間に
// 二面幅が flat_b まで直線的に絞られる。皿ネジの逃げに使う。
// 2D の六角は hex_hole と同じ流儀 (対角 = 二面幅/cos30、$fn=6 で flat-up)
module
hex_y_taper_flat_up(flat_a, flat_b, l)
{
    rotate([ -90, 0, 0 ]) linear_extrude(height = l, scale = flat_b / flat_a)
        circle(d = flat_a / cos(30), $fn = 6);
}

// 外形の2D輪郭。取付座・両ポケット・デスク側の段を2Dで足してから
// opening (縮めてから膨らませる) を掛け、凸の角だけを R2 に丸める。
// 凹の角 (座とポケットの取り合い) は opening では丸まらないので、接合部の
// 肉は full 断面のまま残る — 各ブロックを個別に丸めて突き合わせると
// 接触面が R の分だけ痩せて折れやすくなるため、この順序で作る。
// 両ポケットのブロックは当たり面ではなくデスク接触面 (y=desk_y) から始める。
// これで、クランプ板の無い左右がデスク面へ当たる段が外形そのものになり、
// 壁厚も他と同じ 3mm に揃う (全幅へ 4.2 の帯を足す旧構成は superseded)。
// クランプ板の逃げは opening の後に切る。板の角は直角なので、逃げの角も
// 直角のまま残す
module
footprint_2d()
{
    difference()
    {
        offset(r = corner_r, $fn = arc_fn) offset(r = -corner_r, $fn = arc_fn)
        {
            translate([ -seat_w / 2, -mount_t ]) square([ seat_w, mount_t ]);
            translate([ ear_x0, desk_y - ear_out_d ])
                square([ ear_out_w, ear_out_d ]);
            translate([ mic_x0, desk_y - mic_out_d ])
                square([ mic_out_w, mic_out_d ]);
            // デスク側の段の帯。ポケットのブロックだけでは中央 (取付座の幅)
            // にデスク接触面が無く、そこが凸の角になって opening で R2 に
            // 丸まる — クランプ板の逃げの内側の角は板の直角と合わせたいので、
            // 帯で全幅を繋いでから逃げを切る
            translate([ ear_x0, 0 ]) square([ outer_w, desk_y ]);
        }
        // クランプ板の逃げ: 当たり面から +Y のデスク帯のうち、中央 24.4 だけ
        // を板の厚み分だけ抜き、そこへ板を挟み込む。+1 は切削の抜き代
        translate([ -clamp_slot_w / 2, 0 ])
            square([ clamp_slot_w, desk_y + 1 ]);
    }
}

// 本体。上端が一平面 Z40 になったので、外形は全高 40 の一様な押し出し1本で
// 足りる (右35 → 左37 → 座40 と段になっていた旧構成は superseded)
module
holder_body()
{
    difference()
    {
        linear_extrude(height = seat_h) footprint_2d();

        // 左ポケット: イヤホンケースの内寸 61.4×29.9・深さ34 (上開き)
        translate([ ear_cav[0], ear_cav[1], ear_floor_t ])
            linear_extrude(height = ear_depth + 1)
                rounded_rect_2d(ear_inner[0], ear_inner[1], pocket_r);

        // 左ポケット床の USB-C 長穴: 横中央 14mm 幅、前壁 (デスク側) の内面
        // から 7.5〜16.0mm。ケーブルは下から刺さる
        translate([ ear_cav_cx - usb_slot_w / 2, usb_slot_y, -0.5 ])
            linear_extrude(height = ear_floor_t + 1) rounded_rect_2d(
                usb_slot_w, usb_slot_back - usb_slot_front, usb_slot_r);

        // 右ポケット: ピンマイクケースの内寸 81.2×38.1・深さ32 (上開き)
        translate([ mic_cav[0], mic_cav[1], mic_floor_t ])
            linear_extrude(height = mic_depth + 1)
                rounded_rect_2d(mic_inner[0], mic_inner[1], pocket_r);

        // 凸のチャンネル: 背面 (デスクの反対側) の中央に 12.7×8.7。背面壁の
        // 全高と床を貫通させ、L字変換器を付けたまま上からストンと落として、
        // ケーブルを下へ抜く。床のそれ以外はケースの受けとして残る。+0.5 は
        // ポケット内寸との重ね代 (切削同士を面で接触させると退化した稜が
        // 残るため)
        translate([ mic_cav_cx - mic_channel[0] / 2, mic_back_inner_y, -0.5 ])
            cube([ mic_channel[0], mic_channel[1] + 0.5, seat_h + 1 ]);

        // M8皿ネジ (軸Y・flat-up): 通し六角が取付座を貫通し、外面 (y=-mount_t)
        // 側に皿の逃げが開く。ネジは部品の外側からクランプ板の M8 メスへ
        // 入り、部品をクランプ板の面へ引き付ける
        translate([ 0, -mount_t / 2, m8_z ])
            hex_y_flat_up(m8_pass_flat, mount_t + 0.2);
        // 皿の逃げは直壁のボアではなく、外面の二面幅16.0 から
        // 深さ4.5 で通し 8.4 へ絞る六角錐台にする。断面がなだらかな三角形に
        // なり、皿がそのまま座る (user 指示)。錐台は同じ勾配のまま外面より
        // m8_head_over だけ外へ出すので、外面の切り口はちょうど 16.0 になる
        translate([ 0, -mount_t - m8_head_over, m8_z ])
            hex_y_taper_flat_up(m8_head_flat + m8_head_over * m8_head_slope,
                                m8_pass_flat,
                                m8_head_depth + m8_head_over);
    }
}

module
earphone_mic_holder()
{
    echo(str("CONTRACT earphone_mic_holder: clamp_plate = ",
             [ clamp_plate_w, clamp_plate_t, clamp_plate_h ]));
    echo(str("CONTRACT earphone_mic_holder: mount_seat = ",
             [ seat_w, mount_t, seat_h ]));
    echo(str("CONTRACT earphone_mic_holder: m8_pass_flat = ", m8_pass_flat));
    echo(str("CONTRACT earphone_mic_holder: m8_head_flat = ", m8_head_flat));
    echo(str("CONTRACT earphone_mic_holder: m8_head_depth = ", m8_head_depth));
    // 皿の逃げは直壁ではなく [外面の二面幅, 底の二面幅, 深さ] の六角錐台
    echo(str("CONTRACT earphone_mic_holder: m8_head_taper = ",
             [ m8_head_flat, m8_pass_flat, m8_head_depth ]));
    echo(str("CONTRACT earphone_mic_holder: m8_center = ", [ 0, m8_z ]));
    echo(str("CONTRACT earphone_mic_holder: screw_engagement = ",
             screw_engagement));
    echo(str("CONTRACT earphone_mic_holder: clearance = ", clearance));
    echo(str("CONTRACT earphone_mic_holder: ear_inner = ",
             [ ear_inner[0], ear_inner[1], ear_depth ]));
    echo(str("CONTRACT earphone_mic_holder: mic_inner = ",
             [ mic_inner[0], mic_inner[1], mic_depth ]));
    echo(str("CONTRACT earphone_mic_holder: mic_channel = ", mic_channel));
    echo(str("CONTRACT earphone_mic_holder: usb_slot = ",
             [ usb_slot_w, usb_slot_back - usb_slot_front ]));
    echo(str("CONTRACT earphone_mic_holder: usb_slot_from_front = ",
             [ usb_slot_front, usb_slot_back ]));
    echo(str("CONTRACT earphone_mic_holder: front_inner_y = ", front_inner_y));
    echo(str("CONTRACT earphone_mic_holder: wall = ", wall));
    echo(str("CONTRACT earphone_mic_holder: floor_t = ",
             [ ear_floor_t, mic_floor_t ]));
    echo(str("CONTRACT earphone_mic_holder: pocket_r = ", pocket_r));
    echo(str("CONTRACT earphone_mic_holder: corner_r = ", corner_r));
    echo(str("CONTRACT earphone_mic_holder: desk_step = ",
             [ clamp_slot_w, clamp_plate_t ]));
    echo(str("CONTRACT earphone_mic_holder: outer = ",
             [ outer_w, outer_d, seat_h ]));

    // 皿ネジの配分 (1e-9 は浮動小数の丸め猶予)。座が厚すぎると軸部が
    // クランプ板の M8 メスへ届かず、薄すぎると皿の座面が抜ける
    assert(mount_t >= m8_head_depth + 1, "mount seat is too thin for the head");
    assert(screw_engagement >= 2 - 1e-9,
           "screw barely reaches the clamp M8 thread");
    assert(screw_engagement <= clamp_plate_t + 1e-9,
           "screw bottoms out through the clamp plate");
    // 皿逃げの六角錐台は取付座 (= クランプ板と同じ 40×24) に収まること
    assert(m8_head_diag <= seat_w + 1e-9,
           "countersink runs past the seat width");
    assert(m8_head_diag <= seat_h + 1e-9,
           "countersink runs past the seat height");
    // opening が取付座の帯を切らない条件 (座はポケット同士を繋ぐ梁でもある)
    assert(mount_t >= 2 * corner_r, "mount_t is too thin for corner_r");
    // ポケットの内側R4が内寸を食い尽くさないこと
    assert(2 * pocket_r <=
               min(ear_inner[0], ear_inner[1], mic_inner[0], mic_inner[1]),
           "pocket_r is too large for the pockets");
    // 凸のチャンネルが内寸の角R4に食い込まないこと (背面中央に収まること)
    assert(mic_channel[0] + 2 * pocket_r <= mic_inner[0],
           "mic channel is too wide for the pocket back wall");
    // USB-C 長穴が左ポケットの床の中に収まること (前壁内面が基準)
    assert(usb_slot_front > 0 && usb_slot_back <= ear_inner[1],
           "USB slot runs past the pocket floor");
    assert(usb_slot_w + 2 * pocket_r <= ear_inner[0],
           "USB slot is too wide for the pocket floor");
    // 上端はクランプ板の上端と同じ一平面であること (必須要件)。深さは
    // 変えずに床で吸収するので、床を動かしたらここで止まる
    assert(ear_out_h == seat_h && mic_out_h == seat_h,
           "pocket tops must be flush with the clamp plate top");
    // クランプ板の逃げがポケットの内寸まで届かないこと (床と壁を抜かない)
    assert(clamp_slot_w / 2 <= mic_x0 + wall,
           "clamp relief reaches into the pockets");
    // 前壁の内面が当たり面より +Y 側に残ること。壁がクランプ板の厚み以上に
    // 厚いと、ポケットの内寸が当たり面を越えてクランプ板の逃げと繋がる
    assert(front_inner_y > 0, "the front wall is thicker than the desk step");

    holder_body();
}

earphone_mic_holder();
